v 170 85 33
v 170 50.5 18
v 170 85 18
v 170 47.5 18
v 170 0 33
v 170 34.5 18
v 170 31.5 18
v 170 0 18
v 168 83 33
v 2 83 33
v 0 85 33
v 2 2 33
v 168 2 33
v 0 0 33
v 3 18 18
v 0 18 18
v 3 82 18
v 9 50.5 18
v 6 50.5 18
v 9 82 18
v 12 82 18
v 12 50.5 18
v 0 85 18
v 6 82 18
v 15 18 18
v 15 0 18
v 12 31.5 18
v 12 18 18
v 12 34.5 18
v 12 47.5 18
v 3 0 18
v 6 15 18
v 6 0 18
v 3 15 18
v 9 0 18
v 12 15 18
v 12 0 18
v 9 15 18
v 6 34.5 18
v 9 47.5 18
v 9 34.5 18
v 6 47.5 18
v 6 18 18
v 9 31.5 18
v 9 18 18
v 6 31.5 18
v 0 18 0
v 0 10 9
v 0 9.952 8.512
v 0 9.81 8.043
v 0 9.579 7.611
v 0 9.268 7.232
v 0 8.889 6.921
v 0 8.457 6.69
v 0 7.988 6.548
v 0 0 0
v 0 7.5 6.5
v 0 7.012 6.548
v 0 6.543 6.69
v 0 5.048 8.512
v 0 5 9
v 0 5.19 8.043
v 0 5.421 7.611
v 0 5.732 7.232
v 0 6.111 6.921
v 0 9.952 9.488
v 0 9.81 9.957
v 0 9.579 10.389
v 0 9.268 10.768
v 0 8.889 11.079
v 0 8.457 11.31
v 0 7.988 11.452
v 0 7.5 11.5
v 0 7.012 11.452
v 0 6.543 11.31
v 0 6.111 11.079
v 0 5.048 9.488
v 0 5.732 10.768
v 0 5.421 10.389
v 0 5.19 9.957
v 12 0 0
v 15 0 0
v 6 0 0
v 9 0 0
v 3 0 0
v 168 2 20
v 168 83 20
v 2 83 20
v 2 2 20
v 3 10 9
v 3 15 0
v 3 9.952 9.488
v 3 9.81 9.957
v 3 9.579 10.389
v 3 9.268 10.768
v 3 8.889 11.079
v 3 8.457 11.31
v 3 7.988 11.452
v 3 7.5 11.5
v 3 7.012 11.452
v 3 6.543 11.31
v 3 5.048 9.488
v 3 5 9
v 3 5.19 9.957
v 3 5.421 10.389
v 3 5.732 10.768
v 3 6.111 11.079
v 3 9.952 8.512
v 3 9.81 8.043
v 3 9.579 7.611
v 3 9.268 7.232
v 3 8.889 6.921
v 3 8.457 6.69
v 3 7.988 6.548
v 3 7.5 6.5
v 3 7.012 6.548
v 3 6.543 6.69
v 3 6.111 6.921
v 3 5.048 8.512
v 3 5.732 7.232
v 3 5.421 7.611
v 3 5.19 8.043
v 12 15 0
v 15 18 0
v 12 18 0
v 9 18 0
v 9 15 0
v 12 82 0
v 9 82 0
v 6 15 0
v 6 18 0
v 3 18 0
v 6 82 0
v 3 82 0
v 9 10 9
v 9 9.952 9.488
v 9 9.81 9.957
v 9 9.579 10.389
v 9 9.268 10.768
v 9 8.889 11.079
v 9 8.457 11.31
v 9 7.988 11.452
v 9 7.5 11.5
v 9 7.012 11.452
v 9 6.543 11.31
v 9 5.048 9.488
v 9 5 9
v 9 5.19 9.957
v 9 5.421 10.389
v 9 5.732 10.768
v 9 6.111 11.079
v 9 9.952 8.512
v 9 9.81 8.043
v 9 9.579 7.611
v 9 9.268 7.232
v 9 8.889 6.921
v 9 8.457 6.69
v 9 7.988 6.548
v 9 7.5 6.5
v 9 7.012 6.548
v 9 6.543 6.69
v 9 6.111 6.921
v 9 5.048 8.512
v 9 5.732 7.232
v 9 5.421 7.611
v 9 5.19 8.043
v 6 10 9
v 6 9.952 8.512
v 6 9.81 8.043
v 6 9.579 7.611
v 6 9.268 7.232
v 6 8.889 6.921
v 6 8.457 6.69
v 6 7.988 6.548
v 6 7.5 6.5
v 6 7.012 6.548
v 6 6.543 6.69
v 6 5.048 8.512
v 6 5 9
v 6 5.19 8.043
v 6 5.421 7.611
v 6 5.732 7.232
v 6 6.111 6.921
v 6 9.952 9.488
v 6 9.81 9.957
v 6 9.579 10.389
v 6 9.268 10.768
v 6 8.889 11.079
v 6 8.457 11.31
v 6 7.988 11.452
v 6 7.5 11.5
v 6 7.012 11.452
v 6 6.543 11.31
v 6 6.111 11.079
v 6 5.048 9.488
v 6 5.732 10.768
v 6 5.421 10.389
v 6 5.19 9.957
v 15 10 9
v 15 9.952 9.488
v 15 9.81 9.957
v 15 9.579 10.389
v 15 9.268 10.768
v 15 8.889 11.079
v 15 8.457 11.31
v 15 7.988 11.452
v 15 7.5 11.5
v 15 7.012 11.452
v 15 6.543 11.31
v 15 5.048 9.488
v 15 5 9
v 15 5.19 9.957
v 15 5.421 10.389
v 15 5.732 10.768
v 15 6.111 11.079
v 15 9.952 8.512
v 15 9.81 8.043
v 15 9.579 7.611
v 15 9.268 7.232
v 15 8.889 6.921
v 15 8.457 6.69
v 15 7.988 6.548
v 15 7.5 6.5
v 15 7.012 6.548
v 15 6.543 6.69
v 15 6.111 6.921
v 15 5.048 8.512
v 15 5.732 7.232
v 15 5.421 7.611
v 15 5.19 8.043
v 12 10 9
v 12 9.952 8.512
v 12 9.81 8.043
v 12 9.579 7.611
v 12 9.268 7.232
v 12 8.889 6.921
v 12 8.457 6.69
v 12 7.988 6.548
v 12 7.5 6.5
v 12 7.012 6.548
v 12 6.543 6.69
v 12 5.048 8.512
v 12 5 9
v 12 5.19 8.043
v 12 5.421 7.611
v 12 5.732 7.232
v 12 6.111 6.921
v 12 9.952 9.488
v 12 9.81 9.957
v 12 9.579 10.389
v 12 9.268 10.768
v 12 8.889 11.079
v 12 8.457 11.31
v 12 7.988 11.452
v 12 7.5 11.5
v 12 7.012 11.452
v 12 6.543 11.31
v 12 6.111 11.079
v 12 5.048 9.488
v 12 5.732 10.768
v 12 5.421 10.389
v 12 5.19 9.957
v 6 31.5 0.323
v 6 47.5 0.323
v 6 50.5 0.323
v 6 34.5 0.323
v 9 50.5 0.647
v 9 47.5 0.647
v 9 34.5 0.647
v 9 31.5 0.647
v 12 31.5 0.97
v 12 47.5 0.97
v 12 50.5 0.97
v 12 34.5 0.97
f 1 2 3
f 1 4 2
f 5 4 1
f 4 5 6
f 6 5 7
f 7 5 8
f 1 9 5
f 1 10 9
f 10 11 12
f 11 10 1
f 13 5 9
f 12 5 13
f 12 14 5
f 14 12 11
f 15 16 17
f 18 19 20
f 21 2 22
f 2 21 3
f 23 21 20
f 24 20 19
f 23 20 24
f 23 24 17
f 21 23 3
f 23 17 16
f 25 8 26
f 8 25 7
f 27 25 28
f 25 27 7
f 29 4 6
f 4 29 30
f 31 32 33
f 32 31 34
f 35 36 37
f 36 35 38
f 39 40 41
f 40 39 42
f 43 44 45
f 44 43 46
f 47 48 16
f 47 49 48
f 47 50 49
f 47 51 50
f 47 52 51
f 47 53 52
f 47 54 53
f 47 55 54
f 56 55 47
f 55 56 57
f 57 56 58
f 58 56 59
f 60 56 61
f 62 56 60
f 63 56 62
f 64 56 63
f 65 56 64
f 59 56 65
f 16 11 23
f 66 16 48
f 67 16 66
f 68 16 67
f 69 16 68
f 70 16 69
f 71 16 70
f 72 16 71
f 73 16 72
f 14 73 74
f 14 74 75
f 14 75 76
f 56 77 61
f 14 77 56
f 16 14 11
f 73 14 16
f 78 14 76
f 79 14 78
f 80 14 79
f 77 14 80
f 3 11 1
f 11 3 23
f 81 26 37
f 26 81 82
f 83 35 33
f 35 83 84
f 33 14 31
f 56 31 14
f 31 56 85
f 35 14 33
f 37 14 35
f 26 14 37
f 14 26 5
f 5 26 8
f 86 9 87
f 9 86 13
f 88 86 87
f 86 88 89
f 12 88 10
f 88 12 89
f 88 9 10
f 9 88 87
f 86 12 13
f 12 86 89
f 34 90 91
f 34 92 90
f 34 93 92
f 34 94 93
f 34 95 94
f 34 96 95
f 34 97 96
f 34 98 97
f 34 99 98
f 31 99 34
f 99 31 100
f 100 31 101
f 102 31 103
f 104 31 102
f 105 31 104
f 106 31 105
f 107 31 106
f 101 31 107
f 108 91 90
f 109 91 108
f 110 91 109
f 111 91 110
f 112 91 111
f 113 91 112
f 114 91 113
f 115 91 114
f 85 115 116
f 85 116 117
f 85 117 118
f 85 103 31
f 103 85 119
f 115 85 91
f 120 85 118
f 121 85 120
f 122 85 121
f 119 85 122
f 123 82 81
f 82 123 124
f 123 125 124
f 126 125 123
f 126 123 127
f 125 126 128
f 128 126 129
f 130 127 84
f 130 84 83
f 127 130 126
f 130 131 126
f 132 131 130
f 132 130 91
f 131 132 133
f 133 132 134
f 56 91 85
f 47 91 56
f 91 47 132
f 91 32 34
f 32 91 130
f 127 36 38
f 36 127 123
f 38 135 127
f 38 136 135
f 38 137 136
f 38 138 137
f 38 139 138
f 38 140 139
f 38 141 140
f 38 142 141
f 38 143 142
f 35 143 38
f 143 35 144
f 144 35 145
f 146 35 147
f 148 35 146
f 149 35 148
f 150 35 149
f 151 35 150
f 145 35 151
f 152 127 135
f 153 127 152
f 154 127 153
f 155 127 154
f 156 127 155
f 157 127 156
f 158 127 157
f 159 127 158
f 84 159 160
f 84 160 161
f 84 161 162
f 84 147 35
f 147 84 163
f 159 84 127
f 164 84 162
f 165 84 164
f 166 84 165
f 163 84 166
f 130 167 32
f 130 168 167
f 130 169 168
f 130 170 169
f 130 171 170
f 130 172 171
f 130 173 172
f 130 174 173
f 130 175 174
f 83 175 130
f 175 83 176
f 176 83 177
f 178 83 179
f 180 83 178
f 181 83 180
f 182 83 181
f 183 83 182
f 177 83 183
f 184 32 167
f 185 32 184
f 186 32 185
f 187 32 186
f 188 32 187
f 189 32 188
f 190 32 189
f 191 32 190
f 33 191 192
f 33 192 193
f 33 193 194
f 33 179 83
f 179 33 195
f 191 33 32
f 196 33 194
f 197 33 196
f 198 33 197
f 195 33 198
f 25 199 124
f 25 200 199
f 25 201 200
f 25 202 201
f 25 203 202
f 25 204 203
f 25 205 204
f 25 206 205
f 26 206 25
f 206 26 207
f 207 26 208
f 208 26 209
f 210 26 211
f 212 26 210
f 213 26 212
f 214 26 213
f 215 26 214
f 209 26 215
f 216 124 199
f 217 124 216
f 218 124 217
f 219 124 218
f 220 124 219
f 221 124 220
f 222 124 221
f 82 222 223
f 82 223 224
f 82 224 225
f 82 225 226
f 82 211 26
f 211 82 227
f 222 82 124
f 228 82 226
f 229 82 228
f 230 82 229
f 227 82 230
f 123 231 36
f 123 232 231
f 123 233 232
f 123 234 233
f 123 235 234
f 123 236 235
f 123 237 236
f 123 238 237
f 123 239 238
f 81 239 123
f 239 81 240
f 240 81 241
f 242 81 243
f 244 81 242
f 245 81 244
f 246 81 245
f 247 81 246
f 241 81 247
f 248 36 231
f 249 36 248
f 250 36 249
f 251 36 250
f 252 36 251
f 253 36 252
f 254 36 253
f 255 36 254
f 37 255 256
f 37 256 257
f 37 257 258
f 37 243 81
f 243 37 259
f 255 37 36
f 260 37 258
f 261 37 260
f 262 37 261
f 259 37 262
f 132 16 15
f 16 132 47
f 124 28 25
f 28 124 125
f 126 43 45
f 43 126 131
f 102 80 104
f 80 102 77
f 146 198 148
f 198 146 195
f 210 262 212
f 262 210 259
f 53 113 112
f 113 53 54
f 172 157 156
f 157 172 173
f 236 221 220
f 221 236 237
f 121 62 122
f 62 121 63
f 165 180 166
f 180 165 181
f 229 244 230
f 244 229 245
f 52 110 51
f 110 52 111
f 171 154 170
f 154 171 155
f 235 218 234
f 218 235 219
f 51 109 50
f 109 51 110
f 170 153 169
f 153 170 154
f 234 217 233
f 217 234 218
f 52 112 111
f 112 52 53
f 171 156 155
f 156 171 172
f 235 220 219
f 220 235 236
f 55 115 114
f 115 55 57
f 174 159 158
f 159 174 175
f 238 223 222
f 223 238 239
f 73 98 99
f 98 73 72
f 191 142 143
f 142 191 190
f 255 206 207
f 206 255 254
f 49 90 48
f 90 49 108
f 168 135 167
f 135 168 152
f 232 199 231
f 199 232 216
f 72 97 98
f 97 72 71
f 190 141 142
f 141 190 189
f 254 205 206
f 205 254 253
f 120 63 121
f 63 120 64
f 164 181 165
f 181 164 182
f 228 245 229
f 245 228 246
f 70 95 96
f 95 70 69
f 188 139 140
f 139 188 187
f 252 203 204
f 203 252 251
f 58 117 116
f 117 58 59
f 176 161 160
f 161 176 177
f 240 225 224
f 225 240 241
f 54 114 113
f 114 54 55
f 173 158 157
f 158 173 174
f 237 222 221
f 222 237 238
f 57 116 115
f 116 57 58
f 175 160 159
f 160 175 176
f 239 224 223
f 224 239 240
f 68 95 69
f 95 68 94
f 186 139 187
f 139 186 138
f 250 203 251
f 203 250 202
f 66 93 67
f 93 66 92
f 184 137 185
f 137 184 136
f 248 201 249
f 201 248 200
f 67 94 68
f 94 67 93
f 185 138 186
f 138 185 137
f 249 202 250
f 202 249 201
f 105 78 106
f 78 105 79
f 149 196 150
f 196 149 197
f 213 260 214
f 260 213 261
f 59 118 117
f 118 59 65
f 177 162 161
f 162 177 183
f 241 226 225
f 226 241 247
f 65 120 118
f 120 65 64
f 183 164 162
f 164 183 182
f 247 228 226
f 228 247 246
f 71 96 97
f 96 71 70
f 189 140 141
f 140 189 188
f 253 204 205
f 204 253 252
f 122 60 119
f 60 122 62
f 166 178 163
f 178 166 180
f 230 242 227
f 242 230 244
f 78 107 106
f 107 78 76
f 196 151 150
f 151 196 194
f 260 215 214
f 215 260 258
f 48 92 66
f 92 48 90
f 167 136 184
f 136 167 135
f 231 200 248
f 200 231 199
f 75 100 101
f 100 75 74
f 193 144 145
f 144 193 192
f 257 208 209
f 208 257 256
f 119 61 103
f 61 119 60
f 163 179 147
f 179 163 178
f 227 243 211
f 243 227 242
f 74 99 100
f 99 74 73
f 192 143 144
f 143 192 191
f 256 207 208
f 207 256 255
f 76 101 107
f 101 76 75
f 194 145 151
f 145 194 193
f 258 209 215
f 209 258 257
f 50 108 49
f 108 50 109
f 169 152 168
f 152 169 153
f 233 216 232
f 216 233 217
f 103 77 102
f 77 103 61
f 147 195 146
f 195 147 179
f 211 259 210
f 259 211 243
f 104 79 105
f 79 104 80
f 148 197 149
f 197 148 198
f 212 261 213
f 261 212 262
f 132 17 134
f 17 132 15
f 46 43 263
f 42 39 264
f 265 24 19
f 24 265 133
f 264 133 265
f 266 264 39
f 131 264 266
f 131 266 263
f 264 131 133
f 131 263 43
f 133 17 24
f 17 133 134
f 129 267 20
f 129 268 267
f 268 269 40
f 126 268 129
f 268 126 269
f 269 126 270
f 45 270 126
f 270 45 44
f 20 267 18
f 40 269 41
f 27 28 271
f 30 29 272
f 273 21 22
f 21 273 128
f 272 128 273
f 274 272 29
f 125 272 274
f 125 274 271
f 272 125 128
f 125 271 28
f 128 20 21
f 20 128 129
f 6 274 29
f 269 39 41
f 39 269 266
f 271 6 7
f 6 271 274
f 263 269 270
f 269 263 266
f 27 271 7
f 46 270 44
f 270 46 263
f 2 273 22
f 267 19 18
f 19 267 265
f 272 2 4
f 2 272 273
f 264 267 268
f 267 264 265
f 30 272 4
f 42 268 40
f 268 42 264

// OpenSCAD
// ===== Parameters =====
case_x     = 170;
case_y     = 85;
case_z     = 15;
atumi      = 2;
arm_height = 18;

$fn = 32;

// ===== Parts =====
module tray(cx, cy, cz, t){
    difference(){
        cube([cx,cy,cz]);
        translate([t,t,t]) cube([cx-2*t, cy-2*t, cz]); // top open
    }
}

// 元の「縦板（側面プレート）」: polygon定義が2回同一だったのでmodule化
module side_plate(sl_x, sl_y, sl_z, cy){
    // 元の points:
    // [0,0],[sl_z,0],[sl_z,cy-sl_y-sl_x],[0,cy-sl_y-sl_x]
    linear_extrude(height=sl_x)
        polygon(points=[
            [0,0],
            [sl_z,0],
            [sl_z, cy - sl_y - sl_x],
            [0,   cy - sl_y - sl_x]
        ]);
}

// 元の「横の三角板」: duplicate point を除去して同一形状に
module brace_triangle(sl_x, sl_z, cx){
    // 元は [0,0],[cx-sl_x,sl_z],[cx-sl_x,sl_z],[0,sl_z]
    // duplicateを除去すると三角形 [0,0],[cx-sl_x,sl_z],[0,sl_z]
    linear_extrude(height=sl_x)
        polygon(points=[
            [0,0],
            [cx - sl_x, sl_z],
            [0, sl_z]
        ]);
}

module joint_01(cx, cy, arm_h,
                sl_x=3, sl_y=15){
    sl_z = arm_h;

    // スリット部（柱3本＋上の連結）
    difference(){
        union(){
            // 柱 0, 2, 4 * sl_x の位置に同形状を3本
            for (i=[0:2:4])
                translate([i*sl_x, 0, 0])
                    cube([sl_x, sl_y, sl_z]);

            // 上の連結（元: translate([0,sl_y,0]) cube([sl_x*(4+1),sl_x,sl_z]);）
            translate([0, sl_y, 0])
                cube([sl_x*5, sl_x, sl_z]);
        }

        // 穴（シリンダ）
        translate([0, sl_y/2, sl_z/2])
            rotate([0,90,0])
                cylinder(h=sl_x*6, r=2.5);
    }

    // 側面プレート2枚（x=sl_x と x=sl_x*3）
    for (xpos=[sl_x, sl_x*3])
        translate([xpos, sl_y, sl_z])
            rotate([0,90,0])
                side_plate(sl_x, sl_y, sl_z, cy);

    // 横の三角板2枚（y=cy/2±4）
    for (ypos=[cy/2-8, cy/2+8])
        translate([sl_x, ypos, 0])
            rotate([90,0,0])
                brace_triangle(sl_x, sl_z, cx);
}

// ===== Assembly =====
translate([0,0,arm_height])
    tray(case_x, case_y, case_z, atumi);

joint_01(case_x, case_y, arm_height);
